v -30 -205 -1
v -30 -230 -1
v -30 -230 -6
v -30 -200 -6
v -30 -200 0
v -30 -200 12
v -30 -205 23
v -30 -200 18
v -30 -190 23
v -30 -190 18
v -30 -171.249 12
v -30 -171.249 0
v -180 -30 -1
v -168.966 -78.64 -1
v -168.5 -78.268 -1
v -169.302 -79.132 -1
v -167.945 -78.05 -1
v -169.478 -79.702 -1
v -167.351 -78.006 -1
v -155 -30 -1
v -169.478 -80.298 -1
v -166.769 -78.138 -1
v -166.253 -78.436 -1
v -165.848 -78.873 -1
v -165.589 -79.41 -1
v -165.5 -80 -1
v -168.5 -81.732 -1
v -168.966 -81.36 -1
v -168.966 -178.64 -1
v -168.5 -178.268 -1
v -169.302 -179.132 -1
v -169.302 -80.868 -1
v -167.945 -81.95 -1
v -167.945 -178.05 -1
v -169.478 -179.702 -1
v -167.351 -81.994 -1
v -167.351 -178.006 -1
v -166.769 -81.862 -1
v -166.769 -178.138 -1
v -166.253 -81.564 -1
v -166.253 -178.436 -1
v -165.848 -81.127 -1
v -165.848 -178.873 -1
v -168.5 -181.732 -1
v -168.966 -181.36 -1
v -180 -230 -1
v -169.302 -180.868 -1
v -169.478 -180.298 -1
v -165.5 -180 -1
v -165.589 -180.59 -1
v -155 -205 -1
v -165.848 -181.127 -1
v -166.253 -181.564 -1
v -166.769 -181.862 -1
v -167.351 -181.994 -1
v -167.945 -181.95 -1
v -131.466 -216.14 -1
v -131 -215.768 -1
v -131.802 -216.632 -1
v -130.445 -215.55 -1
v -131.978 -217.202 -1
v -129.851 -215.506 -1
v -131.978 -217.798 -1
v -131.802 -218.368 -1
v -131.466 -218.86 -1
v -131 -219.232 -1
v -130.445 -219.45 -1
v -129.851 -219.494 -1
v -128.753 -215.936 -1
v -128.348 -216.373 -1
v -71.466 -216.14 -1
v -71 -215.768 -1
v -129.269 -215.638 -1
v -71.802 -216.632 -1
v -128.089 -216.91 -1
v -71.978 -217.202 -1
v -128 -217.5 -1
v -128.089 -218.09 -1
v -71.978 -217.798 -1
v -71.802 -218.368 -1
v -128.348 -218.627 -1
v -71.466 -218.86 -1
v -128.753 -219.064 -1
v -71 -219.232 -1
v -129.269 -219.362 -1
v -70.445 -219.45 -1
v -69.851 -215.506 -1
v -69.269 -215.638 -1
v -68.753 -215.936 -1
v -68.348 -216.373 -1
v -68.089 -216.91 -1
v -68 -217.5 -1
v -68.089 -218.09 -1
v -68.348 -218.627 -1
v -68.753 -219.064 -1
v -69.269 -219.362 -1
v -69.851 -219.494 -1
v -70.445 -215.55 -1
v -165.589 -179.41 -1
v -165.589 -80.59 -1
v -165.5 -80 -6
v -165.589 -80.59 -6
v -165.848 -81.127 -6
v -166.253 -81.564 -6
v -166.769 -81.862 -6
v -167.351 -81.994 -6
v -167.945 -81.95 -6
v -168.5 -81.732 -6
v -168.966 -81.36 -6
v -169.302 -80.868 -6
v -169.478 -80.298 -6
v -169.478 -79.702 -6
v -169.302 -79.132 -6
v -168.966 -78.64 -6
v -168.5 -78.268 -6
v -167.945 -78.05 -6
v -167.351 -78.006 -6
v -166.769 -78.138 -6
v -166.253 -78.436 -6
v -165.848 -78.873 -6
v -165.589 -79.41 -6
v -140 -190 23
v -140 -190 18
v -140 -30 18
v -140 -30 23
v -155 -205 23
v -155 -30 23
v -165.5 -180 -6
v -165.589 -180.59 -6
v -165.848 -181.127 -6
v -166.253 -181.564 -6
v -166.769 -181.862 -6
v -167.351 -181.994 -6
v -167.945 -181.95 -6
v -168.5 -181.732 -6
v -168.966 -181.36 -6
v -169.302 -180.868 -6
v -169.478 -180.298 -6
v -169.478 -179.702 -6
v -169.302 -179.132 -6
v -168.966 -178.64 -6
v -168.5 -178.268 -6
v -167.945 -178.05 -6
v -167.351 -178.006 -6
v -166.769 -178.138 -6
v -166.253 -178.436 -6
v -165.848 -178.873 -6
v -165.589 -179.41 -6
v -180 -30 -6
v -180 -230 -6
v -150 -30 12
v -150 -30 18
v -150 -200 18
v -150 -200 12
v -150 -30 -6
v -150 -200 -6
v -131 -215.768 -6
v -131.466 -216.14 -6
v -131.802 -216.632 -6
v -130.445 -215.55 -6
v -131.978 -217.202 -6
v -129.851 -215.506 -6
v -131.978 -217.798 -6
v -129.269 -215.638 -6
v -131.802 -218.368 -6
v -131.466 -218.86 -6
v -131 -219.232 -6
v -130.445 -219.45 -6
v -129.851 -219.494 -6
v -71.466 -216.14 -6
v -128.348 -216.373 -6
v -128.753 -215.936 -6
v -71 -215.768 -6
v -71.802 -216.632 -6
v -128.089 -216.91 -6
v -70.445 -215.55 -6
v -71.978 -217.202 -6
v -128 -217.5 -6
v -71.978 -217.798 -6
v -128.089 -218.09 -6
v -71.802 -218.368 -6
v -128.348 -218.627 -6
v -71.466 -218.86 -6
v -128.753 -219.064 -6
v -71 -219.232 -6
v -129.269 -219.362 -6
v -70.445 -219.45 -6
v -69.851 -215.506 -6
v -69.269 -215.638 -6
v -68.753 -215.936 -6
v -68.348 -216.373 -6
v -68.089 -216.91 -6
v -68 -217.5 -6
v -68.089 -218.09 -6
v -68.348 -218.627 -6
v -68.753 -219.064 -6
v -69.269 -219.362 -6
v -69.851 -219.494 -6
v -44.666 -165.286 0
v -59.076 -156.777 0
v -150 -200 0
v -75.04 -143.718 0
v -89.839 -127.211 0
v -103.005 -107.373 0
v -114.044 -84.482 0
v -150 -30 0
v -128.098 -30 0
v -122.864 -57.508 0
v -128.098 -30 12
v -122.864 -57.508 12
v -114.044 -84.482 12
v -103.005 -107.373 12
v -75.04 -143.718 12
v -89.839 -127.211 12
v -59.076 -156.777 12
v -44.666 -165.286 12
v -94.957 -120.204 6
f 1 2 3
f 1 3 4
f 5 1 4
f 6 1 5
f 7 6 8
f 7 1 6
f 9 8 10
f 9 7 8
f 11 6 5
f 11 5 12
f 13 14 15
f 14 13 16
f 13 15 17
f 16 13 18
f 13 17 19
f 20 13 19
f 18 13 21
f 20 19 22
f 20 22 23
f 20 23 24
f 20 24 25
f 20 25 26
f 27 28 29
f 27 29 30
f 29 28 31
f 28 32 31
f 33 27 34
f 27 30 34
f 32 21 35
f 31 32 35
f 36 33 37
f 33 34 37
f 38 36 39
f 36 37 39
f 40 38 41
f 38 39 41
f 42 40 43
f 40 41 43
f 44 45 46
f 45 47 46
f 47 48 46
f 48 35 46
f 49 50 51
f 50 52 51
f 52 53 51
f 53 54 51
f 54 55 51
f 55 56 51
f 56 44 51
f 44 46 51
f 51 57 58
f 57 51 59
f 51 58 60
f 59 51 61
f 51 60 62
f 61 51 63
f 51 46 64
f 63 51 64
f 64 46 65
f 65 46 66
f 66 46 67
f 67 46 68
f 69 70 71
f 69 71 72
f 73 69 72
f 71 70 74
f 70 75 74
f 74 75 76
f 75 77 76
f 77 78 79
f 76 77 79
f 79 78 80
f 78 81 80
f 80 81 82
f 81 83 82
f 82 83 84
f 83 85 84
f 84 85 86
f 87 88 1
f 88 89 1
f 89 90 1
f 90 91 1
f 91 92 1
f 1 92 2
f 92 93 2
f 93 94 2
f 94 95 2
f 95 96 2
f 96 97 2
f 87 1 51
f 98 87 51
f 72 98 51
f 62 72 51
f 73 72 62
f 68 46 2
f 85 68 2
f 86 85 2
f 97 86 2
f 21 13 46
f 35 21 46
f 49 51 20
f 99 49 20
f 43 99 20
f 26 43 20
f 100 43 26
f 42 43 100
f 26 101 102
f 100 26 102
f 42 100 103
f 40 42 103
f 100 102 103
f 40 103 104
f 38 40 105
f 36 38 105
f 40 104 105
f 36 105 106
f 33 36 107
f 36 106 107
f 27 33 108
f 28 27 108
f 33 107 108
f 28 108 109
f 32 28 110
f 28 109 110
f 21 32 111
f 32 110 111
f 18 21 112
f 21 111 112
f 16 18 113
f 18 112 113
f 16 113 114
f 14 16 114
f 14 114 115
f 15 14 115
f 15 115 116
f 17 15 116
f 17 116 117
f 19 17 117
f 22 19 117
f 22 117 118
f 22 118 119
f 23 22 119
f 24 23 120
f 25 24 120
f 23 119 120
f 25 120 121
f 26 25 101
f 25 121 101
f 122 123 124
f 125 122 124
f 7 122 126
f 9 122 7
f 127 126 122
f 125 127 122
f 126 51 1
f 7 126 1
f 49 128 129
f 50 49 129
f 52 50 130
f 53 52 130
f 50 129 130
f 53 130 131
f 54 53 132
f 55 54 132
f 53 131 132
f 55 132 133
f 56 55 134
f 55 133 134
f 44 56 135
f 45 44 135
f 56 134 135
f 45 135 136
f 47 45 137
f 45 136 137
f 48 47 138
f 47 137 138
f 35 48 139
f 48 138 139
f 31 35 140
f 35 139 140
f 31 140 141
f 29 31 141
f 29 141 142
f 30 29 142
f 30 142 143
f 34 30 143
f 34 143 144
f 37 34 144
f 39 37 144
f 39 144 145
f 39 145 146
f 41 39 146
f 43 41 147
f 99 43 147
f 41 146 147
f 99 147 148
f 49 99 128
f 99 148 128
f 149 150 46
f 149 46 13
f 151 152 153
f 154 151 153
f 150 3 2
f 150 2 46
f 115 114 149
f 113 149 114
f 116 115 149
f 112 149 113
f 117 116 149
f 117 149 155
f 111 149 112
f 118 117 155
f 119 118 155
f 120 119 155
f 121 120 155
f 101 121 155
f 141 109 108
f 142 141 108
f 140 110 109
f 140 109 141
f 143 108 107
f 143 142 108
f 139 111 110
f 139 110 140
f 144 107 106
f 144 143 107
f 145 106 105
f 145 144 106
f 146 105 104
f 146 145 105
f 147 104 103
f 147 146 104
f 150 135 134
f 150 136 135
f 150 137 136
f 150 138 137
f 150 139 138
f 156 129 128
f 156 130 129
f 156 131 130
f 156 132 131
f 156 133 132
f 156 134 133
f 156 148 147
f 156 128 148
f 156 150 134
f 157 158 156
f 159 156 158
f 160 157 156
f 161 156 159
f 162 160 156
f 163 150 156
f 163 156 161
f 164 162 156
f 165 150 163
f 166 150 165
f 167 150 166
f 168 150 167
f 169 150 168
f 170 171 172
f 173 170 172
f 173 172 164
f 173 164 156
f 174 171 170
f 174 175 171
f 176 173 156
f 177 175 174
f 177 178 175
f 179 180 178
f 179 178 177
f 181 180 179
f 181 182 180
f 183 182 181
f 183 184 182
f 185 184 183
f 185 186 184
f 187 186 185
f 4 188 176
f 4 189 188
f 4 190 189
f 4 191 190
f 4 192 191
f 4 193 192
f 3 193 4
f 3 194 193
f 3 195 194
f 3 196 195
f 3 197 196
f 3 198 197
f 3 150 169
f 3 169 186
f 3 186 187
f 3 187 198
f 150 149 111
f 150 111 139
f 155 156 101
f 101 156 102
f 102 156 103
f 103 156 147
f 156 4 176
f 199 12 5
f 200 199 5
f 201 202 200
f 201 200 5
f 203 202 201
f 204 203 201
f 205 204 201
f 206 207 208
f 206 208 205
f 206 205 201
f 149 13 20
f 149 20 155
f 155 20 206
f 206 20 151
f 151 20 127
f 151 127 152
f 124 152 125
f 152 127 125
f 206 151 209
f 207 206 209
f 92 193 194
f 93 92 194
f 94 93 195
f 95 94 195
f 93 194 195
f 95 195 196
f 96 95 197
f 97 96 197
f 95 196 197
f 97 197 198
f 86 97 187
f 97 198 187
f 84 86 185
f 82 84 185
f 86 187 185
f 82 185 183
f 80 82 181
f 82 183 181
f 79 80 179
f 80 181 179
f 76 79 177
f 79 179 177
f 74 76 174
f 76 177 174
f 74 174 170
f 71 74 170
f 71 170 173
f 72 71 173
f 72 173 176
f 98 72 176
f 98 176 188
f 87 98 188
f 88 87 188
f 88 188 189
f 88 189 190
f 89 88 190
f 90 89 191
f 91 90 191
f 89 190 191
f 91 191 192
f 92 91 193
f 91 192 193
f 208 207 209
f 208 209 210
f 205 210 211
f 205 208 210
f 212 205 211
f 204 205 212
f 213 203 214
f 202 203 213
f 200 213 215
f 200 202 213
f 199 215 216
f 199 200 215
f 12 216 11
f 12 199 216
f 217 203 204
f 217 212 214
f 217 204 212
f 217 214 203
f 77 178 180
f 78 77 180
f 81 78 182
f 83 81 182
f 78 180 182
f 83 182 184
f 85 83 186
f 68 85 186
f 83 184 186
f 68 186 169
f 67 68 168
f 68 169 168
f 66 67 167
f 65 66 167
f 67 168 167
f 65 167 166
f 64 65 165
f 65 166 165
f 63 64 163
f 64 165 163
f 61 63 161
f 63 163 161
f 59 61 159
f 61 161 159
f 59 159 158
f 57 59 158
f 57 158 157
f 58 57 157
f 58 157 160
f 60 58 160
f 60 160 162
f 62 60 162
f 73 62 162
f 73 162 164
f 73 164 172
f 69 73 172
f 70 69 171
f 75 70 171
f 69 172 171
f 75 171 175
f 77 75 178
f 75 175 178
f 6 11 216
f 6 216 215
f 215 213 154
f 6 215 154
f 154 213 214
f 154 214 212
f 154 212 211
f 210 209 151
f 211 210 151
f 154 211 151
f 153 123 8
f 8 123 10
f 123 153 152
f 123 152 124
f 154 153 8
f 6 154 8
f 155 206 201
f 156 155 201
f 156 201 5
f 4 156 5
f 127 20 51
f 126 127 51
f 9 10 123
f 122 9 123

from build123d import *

# Parameters (mm, degrees)
F1_DEPTH  = 12
F2_W      = 150
F2_H      = 24
F3_DEPTH  = 5
F4_W      = 205
F4_H      = 24
F5_DEPTH  = 5
F6_R      = 2
F7_DEPTH  = 5
F9_DEPTH  = 5
F10_W     = 30
F10_H     = 30
F10_W_2   = 150
F10_H_2   = 200
F11_DEPTH = 25


with BuildPart() as f1:
    # F0 (on Top) → F1 (new body)
    with BuildSketch(Plane.XY):
        with BuildLine():
            add(Edge.make_bspline(
                [(-130, 0), (-130, -176), (0, -176)],
                knots=[1.5707963268, 1.5707963268, 1.5707963268, 3.1415926536, 3.1415926536, 3.1415926536], degree=2, weights=[1, 0.7071067812, 1]))
            Line((-130, 0), (-130, -176))
            Line((-130, -176), (0, -176))
        make_face()
        Polygon((-130, -176), (-130, 0), (-150, 0), (-150, -200), (0, -200), (0, -176), align=None)
    extrude(amount=F1_DEPTH)

    # F2 (on face) → F3 (join)
    with BuildSketch(Plane.XZ.offset(200)):
        with Locations((-75, 6)):
            Rectangle(F2_W, F2_H)
    extrude(amount=F3_DEPTH)

    # F4 (on face) → F5 (join)
    with BuildSketch(Plane(origin=(-150, 0, 0), x_dir=(0, -1, 0), z_dir=(-1, 0, 0))):
        with Locations((102.5, 6)):
            Rectangle(F4_W, F4_H)
    extrude(amount=F5_DEPTH)

    # F6 (on face) → F7 (join)
    with BuildSketch(Plane(origin=(0, 0, -6), x_dir=(1, 0, 0), z_dir=(0, 0, -1))):
        Polygon((0, 205), (0, 230), (-180, 230), (-180, 0), (-155, 0), (-155, 205), align=None)
        with Locations((-167.5, 80)):
            Circle(F6_R, mode=Mode.SUBTRACT)
        with Locations((-167.5, 180)):
            Circle(F6_R, mode=Mode.SUBTRACT)
        with Locations((-130, 217.5)):
            Circle(F6_R, mode=Mode.SUBTRACT)
        with Locations((-70, 217.5)):
            Circle(F6_R, mode=Mode.SUBTRACT)
    extrude(amount=-F7_DEPTH)

    # F8 (on face) → F9 (join)
    with BuildSketch(Plane.XY.offset(18)):
        Polygon((-140, 0), (-155, 0), (-155, -205), (0, -205), (0, -190), (-140, -190), align=None)
    extrude(amount=F9_DEPTH)

    # F10 (on Top) → F11 (cut, symmetric)
    with BuildSketch(Plane.XY):
        with Locations((-15, -15)):
            Rectangle(F10_W, F10_H)
        with Locations((-105, -15)):
            Rectangle(F10_W_2, F10_H)
        with Locations((-15, -130)):
            Rectangle(F10_W, F10_H_2)
    extrude(amount=F11_DEPTH, both=True, mode=Mode.SUBTRACT)


solid = f1.part
